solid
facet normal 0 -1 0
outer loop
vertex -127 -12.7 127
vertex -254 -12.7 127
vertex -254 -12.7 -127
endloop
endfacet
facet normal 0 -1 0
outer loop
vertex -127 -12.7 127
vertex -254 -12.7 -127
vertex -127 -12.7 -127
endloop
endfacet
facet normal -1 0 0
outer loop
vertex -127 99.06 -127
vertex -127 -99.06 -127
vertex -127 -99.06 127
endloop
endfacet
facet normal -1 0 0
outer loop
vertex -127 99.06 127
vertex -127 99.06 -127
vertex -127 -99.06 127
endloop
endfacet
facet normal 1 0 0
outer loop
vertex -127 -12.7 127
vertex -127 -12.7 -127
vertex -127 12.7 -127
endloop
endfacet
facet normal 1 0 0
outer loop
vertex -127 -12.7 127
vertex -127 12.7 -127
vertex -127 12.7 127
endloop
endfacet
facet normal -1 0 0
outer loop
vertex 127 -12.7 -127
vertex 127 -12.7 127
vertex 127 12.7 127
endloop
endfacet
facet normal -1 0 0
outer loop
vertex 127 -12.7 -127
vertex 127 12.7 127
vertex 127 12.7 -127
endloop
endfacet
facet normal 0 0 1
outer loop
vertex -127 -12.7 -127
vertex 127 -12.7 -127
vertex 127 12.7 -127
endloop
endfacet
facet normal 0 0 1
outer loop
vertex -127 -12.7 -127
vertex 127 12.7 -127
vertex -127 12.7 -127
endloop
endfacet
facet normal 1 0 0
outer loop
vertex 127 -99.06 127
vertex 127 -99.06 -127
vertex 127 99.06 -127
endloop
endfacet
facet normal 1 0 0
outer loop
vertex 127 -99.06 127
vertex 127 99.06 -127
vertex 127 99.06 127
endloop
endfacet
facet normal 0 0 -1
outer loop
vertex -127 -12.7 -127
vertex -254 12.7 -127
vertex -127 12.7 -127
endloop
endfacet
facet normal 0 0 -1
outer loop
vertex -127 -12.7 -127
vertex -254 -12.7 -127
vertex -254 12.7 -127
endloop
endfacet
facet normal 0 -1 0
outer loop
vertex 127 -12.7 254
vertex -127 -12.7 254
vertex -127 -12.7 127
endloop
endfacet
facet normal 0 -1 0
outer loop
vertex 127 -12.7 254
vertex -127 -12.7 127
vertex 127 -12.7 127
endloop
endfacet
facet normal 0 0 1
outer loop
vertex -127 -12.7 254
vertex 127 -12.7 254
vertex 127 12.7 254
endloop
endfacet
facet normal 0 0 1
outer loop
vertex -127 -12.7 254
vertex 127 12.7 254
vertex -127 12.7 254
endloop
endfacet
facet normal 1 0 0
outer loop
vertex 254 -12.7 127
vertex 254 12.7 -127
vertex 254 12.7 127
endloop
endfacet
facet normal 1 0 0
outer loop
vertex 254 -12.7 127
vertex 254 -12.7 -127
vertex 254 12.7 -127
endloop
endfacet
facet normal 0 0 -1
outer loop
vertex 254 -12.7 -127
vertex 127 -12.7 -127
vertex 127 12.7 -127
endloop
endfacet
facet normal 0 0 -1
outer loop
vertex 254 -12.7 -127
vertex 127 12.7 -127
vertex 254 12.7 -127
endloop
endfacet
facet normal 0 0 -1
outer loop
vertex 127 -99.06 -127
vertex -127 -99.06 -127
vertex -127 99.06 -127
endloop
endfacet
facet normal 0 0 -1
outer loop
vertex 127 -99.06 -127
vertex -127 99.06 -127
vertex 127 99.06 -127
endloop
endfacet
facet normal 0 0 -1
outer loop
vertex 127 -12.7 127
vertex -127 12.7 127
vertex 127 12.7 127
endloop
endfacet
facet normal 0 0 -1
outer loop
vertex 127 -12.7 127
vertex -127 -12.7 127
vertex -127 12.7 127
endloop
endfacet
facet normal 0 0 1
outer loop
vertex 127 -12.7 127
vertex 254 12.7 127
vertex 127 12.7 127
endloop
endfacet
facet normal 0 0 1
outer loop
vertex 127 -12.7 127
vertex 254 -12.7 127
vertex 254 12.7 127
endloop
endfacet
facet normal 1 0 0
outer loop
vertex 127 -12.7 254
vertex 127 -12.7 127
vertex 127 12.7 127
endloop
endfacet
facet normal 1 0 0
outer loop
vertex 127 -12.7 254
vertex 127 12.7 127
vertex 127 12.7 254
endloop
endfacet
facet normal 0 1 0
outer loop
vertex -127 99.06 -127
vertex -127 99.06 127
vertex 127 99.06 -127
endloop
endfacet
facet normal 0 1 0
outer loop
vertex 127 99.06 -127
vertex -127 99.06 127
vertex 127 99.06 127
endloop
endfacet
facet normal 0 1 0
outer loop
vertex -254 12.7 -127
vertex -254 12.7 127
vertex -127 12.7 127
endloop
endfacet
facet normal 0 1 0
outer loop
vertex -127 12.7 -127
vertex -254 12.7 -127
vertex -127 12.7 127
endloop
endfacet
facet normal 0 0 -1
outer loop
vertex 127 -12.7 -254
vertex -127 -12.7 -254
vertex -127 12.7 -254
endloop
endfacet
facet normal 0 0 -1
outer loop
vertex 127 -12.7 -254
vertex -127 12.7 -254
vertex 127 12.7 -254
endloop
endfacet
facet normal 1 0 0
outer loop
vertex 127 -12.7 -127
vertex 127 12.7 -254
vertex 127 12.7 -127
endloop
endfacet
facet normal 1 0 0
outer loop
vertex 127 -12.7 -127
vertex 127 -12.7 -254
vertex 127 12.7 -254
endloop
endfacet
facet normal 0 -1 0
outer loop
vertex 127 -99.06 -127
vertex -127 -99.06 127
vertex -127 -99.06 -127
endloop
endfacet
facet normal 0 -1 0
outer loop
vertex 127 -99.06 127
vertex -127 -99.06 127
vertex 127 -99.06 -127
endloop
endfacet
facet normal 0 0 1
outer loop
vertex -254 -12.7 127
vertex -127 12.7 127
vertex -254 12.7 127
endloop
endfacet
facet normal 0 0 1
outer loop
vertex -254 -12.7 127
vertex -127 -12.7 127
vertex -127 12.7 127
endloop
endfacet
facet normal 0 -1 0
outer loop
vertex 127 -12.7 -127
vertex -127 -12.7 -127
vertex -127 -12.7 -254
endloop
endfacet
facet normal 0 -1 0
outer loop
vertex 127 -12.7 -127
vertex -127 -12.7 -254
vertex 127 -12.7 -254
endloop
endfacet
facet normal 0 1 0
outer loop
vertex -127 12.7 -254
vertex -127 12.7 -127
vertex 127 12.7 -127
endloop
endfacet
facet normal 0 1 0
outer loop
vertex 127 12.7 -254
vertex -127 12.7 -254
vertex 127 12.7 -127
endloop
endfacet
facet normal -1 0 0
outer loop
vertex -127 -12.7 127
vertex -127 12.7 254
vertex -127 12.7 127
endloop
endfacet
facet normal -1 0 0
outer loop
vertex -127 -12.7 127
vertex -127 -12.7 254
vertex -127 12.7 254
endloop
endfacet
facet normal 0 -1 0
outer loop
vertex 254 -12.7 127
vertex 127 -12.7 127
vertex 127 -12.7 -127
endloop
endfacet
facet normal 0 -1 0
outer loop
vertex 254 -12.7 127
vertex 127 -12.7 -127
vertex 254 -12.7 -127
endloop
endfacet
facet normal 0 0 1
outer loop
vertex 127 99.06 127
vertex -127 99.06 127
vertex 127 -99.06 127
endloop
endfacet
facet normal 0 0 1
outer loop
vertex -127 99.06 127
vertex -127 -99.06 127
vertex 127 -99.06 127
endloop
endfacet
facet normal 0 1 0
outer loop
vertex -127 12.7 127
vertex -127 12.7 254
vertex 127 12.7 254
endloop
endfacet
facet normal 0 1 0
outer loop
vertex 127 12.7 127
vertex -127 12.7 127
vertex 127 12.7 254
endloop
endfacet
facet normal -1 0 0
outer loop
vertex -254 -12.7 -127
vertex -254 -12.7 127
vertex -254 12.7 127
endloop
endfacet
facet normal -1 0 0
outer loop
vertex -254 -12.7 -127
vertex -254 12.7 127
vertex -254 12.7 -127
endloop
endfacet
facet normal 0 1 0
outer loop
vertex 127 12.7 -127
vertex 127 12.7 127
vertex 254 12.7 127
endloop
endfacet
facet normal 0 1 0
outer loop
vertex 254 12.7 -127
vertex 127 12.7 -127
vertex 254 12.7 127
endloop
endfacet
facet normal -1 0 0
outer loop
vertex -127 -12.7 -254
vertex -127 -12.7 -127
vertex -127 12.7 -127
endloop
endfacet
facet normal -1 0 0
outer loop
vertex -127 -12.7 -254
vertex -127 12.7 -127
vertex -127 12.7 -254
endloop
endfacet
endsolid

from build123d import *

# Parameters (mm, degrees)
F1_DEPTH = 12.7
F0_W     = 254
F0_H     = 254
F2_DEPTH = 99.06


with BuildPart() as f1:
    # F0 (on Front) → F1 (new body, symmetric)
    with BuildSketch(Plane.XZ):
        Polygon((-127, 254), (-127, 127), (127, 127), (127, 254), (0, 254), align=None)
        Polygon((-254, 127), (-254, 0), (-254, -127), (-127, -127), (-127, 127), align=None)
        Polygon((127, -127), (-127, -127), (-127, -254), (0, -254), (127, -254), align=None)
        Polygon((254, 127), (127, 127), (127, -127), (254, -127), (254, 0), align=None)
    extrude(amount=F1_DEPTH, both=True)


with BuildPart() as f2:
    # F0 (on Front) → F2 (new body, symmetric)
    with BuildSketch(Plane.XZ):
        Rectangle(F0_W, F0_H)
    extrude(amount=F2_DEPTH, both=True)


solid = Compound([f1.part, f2.part])
